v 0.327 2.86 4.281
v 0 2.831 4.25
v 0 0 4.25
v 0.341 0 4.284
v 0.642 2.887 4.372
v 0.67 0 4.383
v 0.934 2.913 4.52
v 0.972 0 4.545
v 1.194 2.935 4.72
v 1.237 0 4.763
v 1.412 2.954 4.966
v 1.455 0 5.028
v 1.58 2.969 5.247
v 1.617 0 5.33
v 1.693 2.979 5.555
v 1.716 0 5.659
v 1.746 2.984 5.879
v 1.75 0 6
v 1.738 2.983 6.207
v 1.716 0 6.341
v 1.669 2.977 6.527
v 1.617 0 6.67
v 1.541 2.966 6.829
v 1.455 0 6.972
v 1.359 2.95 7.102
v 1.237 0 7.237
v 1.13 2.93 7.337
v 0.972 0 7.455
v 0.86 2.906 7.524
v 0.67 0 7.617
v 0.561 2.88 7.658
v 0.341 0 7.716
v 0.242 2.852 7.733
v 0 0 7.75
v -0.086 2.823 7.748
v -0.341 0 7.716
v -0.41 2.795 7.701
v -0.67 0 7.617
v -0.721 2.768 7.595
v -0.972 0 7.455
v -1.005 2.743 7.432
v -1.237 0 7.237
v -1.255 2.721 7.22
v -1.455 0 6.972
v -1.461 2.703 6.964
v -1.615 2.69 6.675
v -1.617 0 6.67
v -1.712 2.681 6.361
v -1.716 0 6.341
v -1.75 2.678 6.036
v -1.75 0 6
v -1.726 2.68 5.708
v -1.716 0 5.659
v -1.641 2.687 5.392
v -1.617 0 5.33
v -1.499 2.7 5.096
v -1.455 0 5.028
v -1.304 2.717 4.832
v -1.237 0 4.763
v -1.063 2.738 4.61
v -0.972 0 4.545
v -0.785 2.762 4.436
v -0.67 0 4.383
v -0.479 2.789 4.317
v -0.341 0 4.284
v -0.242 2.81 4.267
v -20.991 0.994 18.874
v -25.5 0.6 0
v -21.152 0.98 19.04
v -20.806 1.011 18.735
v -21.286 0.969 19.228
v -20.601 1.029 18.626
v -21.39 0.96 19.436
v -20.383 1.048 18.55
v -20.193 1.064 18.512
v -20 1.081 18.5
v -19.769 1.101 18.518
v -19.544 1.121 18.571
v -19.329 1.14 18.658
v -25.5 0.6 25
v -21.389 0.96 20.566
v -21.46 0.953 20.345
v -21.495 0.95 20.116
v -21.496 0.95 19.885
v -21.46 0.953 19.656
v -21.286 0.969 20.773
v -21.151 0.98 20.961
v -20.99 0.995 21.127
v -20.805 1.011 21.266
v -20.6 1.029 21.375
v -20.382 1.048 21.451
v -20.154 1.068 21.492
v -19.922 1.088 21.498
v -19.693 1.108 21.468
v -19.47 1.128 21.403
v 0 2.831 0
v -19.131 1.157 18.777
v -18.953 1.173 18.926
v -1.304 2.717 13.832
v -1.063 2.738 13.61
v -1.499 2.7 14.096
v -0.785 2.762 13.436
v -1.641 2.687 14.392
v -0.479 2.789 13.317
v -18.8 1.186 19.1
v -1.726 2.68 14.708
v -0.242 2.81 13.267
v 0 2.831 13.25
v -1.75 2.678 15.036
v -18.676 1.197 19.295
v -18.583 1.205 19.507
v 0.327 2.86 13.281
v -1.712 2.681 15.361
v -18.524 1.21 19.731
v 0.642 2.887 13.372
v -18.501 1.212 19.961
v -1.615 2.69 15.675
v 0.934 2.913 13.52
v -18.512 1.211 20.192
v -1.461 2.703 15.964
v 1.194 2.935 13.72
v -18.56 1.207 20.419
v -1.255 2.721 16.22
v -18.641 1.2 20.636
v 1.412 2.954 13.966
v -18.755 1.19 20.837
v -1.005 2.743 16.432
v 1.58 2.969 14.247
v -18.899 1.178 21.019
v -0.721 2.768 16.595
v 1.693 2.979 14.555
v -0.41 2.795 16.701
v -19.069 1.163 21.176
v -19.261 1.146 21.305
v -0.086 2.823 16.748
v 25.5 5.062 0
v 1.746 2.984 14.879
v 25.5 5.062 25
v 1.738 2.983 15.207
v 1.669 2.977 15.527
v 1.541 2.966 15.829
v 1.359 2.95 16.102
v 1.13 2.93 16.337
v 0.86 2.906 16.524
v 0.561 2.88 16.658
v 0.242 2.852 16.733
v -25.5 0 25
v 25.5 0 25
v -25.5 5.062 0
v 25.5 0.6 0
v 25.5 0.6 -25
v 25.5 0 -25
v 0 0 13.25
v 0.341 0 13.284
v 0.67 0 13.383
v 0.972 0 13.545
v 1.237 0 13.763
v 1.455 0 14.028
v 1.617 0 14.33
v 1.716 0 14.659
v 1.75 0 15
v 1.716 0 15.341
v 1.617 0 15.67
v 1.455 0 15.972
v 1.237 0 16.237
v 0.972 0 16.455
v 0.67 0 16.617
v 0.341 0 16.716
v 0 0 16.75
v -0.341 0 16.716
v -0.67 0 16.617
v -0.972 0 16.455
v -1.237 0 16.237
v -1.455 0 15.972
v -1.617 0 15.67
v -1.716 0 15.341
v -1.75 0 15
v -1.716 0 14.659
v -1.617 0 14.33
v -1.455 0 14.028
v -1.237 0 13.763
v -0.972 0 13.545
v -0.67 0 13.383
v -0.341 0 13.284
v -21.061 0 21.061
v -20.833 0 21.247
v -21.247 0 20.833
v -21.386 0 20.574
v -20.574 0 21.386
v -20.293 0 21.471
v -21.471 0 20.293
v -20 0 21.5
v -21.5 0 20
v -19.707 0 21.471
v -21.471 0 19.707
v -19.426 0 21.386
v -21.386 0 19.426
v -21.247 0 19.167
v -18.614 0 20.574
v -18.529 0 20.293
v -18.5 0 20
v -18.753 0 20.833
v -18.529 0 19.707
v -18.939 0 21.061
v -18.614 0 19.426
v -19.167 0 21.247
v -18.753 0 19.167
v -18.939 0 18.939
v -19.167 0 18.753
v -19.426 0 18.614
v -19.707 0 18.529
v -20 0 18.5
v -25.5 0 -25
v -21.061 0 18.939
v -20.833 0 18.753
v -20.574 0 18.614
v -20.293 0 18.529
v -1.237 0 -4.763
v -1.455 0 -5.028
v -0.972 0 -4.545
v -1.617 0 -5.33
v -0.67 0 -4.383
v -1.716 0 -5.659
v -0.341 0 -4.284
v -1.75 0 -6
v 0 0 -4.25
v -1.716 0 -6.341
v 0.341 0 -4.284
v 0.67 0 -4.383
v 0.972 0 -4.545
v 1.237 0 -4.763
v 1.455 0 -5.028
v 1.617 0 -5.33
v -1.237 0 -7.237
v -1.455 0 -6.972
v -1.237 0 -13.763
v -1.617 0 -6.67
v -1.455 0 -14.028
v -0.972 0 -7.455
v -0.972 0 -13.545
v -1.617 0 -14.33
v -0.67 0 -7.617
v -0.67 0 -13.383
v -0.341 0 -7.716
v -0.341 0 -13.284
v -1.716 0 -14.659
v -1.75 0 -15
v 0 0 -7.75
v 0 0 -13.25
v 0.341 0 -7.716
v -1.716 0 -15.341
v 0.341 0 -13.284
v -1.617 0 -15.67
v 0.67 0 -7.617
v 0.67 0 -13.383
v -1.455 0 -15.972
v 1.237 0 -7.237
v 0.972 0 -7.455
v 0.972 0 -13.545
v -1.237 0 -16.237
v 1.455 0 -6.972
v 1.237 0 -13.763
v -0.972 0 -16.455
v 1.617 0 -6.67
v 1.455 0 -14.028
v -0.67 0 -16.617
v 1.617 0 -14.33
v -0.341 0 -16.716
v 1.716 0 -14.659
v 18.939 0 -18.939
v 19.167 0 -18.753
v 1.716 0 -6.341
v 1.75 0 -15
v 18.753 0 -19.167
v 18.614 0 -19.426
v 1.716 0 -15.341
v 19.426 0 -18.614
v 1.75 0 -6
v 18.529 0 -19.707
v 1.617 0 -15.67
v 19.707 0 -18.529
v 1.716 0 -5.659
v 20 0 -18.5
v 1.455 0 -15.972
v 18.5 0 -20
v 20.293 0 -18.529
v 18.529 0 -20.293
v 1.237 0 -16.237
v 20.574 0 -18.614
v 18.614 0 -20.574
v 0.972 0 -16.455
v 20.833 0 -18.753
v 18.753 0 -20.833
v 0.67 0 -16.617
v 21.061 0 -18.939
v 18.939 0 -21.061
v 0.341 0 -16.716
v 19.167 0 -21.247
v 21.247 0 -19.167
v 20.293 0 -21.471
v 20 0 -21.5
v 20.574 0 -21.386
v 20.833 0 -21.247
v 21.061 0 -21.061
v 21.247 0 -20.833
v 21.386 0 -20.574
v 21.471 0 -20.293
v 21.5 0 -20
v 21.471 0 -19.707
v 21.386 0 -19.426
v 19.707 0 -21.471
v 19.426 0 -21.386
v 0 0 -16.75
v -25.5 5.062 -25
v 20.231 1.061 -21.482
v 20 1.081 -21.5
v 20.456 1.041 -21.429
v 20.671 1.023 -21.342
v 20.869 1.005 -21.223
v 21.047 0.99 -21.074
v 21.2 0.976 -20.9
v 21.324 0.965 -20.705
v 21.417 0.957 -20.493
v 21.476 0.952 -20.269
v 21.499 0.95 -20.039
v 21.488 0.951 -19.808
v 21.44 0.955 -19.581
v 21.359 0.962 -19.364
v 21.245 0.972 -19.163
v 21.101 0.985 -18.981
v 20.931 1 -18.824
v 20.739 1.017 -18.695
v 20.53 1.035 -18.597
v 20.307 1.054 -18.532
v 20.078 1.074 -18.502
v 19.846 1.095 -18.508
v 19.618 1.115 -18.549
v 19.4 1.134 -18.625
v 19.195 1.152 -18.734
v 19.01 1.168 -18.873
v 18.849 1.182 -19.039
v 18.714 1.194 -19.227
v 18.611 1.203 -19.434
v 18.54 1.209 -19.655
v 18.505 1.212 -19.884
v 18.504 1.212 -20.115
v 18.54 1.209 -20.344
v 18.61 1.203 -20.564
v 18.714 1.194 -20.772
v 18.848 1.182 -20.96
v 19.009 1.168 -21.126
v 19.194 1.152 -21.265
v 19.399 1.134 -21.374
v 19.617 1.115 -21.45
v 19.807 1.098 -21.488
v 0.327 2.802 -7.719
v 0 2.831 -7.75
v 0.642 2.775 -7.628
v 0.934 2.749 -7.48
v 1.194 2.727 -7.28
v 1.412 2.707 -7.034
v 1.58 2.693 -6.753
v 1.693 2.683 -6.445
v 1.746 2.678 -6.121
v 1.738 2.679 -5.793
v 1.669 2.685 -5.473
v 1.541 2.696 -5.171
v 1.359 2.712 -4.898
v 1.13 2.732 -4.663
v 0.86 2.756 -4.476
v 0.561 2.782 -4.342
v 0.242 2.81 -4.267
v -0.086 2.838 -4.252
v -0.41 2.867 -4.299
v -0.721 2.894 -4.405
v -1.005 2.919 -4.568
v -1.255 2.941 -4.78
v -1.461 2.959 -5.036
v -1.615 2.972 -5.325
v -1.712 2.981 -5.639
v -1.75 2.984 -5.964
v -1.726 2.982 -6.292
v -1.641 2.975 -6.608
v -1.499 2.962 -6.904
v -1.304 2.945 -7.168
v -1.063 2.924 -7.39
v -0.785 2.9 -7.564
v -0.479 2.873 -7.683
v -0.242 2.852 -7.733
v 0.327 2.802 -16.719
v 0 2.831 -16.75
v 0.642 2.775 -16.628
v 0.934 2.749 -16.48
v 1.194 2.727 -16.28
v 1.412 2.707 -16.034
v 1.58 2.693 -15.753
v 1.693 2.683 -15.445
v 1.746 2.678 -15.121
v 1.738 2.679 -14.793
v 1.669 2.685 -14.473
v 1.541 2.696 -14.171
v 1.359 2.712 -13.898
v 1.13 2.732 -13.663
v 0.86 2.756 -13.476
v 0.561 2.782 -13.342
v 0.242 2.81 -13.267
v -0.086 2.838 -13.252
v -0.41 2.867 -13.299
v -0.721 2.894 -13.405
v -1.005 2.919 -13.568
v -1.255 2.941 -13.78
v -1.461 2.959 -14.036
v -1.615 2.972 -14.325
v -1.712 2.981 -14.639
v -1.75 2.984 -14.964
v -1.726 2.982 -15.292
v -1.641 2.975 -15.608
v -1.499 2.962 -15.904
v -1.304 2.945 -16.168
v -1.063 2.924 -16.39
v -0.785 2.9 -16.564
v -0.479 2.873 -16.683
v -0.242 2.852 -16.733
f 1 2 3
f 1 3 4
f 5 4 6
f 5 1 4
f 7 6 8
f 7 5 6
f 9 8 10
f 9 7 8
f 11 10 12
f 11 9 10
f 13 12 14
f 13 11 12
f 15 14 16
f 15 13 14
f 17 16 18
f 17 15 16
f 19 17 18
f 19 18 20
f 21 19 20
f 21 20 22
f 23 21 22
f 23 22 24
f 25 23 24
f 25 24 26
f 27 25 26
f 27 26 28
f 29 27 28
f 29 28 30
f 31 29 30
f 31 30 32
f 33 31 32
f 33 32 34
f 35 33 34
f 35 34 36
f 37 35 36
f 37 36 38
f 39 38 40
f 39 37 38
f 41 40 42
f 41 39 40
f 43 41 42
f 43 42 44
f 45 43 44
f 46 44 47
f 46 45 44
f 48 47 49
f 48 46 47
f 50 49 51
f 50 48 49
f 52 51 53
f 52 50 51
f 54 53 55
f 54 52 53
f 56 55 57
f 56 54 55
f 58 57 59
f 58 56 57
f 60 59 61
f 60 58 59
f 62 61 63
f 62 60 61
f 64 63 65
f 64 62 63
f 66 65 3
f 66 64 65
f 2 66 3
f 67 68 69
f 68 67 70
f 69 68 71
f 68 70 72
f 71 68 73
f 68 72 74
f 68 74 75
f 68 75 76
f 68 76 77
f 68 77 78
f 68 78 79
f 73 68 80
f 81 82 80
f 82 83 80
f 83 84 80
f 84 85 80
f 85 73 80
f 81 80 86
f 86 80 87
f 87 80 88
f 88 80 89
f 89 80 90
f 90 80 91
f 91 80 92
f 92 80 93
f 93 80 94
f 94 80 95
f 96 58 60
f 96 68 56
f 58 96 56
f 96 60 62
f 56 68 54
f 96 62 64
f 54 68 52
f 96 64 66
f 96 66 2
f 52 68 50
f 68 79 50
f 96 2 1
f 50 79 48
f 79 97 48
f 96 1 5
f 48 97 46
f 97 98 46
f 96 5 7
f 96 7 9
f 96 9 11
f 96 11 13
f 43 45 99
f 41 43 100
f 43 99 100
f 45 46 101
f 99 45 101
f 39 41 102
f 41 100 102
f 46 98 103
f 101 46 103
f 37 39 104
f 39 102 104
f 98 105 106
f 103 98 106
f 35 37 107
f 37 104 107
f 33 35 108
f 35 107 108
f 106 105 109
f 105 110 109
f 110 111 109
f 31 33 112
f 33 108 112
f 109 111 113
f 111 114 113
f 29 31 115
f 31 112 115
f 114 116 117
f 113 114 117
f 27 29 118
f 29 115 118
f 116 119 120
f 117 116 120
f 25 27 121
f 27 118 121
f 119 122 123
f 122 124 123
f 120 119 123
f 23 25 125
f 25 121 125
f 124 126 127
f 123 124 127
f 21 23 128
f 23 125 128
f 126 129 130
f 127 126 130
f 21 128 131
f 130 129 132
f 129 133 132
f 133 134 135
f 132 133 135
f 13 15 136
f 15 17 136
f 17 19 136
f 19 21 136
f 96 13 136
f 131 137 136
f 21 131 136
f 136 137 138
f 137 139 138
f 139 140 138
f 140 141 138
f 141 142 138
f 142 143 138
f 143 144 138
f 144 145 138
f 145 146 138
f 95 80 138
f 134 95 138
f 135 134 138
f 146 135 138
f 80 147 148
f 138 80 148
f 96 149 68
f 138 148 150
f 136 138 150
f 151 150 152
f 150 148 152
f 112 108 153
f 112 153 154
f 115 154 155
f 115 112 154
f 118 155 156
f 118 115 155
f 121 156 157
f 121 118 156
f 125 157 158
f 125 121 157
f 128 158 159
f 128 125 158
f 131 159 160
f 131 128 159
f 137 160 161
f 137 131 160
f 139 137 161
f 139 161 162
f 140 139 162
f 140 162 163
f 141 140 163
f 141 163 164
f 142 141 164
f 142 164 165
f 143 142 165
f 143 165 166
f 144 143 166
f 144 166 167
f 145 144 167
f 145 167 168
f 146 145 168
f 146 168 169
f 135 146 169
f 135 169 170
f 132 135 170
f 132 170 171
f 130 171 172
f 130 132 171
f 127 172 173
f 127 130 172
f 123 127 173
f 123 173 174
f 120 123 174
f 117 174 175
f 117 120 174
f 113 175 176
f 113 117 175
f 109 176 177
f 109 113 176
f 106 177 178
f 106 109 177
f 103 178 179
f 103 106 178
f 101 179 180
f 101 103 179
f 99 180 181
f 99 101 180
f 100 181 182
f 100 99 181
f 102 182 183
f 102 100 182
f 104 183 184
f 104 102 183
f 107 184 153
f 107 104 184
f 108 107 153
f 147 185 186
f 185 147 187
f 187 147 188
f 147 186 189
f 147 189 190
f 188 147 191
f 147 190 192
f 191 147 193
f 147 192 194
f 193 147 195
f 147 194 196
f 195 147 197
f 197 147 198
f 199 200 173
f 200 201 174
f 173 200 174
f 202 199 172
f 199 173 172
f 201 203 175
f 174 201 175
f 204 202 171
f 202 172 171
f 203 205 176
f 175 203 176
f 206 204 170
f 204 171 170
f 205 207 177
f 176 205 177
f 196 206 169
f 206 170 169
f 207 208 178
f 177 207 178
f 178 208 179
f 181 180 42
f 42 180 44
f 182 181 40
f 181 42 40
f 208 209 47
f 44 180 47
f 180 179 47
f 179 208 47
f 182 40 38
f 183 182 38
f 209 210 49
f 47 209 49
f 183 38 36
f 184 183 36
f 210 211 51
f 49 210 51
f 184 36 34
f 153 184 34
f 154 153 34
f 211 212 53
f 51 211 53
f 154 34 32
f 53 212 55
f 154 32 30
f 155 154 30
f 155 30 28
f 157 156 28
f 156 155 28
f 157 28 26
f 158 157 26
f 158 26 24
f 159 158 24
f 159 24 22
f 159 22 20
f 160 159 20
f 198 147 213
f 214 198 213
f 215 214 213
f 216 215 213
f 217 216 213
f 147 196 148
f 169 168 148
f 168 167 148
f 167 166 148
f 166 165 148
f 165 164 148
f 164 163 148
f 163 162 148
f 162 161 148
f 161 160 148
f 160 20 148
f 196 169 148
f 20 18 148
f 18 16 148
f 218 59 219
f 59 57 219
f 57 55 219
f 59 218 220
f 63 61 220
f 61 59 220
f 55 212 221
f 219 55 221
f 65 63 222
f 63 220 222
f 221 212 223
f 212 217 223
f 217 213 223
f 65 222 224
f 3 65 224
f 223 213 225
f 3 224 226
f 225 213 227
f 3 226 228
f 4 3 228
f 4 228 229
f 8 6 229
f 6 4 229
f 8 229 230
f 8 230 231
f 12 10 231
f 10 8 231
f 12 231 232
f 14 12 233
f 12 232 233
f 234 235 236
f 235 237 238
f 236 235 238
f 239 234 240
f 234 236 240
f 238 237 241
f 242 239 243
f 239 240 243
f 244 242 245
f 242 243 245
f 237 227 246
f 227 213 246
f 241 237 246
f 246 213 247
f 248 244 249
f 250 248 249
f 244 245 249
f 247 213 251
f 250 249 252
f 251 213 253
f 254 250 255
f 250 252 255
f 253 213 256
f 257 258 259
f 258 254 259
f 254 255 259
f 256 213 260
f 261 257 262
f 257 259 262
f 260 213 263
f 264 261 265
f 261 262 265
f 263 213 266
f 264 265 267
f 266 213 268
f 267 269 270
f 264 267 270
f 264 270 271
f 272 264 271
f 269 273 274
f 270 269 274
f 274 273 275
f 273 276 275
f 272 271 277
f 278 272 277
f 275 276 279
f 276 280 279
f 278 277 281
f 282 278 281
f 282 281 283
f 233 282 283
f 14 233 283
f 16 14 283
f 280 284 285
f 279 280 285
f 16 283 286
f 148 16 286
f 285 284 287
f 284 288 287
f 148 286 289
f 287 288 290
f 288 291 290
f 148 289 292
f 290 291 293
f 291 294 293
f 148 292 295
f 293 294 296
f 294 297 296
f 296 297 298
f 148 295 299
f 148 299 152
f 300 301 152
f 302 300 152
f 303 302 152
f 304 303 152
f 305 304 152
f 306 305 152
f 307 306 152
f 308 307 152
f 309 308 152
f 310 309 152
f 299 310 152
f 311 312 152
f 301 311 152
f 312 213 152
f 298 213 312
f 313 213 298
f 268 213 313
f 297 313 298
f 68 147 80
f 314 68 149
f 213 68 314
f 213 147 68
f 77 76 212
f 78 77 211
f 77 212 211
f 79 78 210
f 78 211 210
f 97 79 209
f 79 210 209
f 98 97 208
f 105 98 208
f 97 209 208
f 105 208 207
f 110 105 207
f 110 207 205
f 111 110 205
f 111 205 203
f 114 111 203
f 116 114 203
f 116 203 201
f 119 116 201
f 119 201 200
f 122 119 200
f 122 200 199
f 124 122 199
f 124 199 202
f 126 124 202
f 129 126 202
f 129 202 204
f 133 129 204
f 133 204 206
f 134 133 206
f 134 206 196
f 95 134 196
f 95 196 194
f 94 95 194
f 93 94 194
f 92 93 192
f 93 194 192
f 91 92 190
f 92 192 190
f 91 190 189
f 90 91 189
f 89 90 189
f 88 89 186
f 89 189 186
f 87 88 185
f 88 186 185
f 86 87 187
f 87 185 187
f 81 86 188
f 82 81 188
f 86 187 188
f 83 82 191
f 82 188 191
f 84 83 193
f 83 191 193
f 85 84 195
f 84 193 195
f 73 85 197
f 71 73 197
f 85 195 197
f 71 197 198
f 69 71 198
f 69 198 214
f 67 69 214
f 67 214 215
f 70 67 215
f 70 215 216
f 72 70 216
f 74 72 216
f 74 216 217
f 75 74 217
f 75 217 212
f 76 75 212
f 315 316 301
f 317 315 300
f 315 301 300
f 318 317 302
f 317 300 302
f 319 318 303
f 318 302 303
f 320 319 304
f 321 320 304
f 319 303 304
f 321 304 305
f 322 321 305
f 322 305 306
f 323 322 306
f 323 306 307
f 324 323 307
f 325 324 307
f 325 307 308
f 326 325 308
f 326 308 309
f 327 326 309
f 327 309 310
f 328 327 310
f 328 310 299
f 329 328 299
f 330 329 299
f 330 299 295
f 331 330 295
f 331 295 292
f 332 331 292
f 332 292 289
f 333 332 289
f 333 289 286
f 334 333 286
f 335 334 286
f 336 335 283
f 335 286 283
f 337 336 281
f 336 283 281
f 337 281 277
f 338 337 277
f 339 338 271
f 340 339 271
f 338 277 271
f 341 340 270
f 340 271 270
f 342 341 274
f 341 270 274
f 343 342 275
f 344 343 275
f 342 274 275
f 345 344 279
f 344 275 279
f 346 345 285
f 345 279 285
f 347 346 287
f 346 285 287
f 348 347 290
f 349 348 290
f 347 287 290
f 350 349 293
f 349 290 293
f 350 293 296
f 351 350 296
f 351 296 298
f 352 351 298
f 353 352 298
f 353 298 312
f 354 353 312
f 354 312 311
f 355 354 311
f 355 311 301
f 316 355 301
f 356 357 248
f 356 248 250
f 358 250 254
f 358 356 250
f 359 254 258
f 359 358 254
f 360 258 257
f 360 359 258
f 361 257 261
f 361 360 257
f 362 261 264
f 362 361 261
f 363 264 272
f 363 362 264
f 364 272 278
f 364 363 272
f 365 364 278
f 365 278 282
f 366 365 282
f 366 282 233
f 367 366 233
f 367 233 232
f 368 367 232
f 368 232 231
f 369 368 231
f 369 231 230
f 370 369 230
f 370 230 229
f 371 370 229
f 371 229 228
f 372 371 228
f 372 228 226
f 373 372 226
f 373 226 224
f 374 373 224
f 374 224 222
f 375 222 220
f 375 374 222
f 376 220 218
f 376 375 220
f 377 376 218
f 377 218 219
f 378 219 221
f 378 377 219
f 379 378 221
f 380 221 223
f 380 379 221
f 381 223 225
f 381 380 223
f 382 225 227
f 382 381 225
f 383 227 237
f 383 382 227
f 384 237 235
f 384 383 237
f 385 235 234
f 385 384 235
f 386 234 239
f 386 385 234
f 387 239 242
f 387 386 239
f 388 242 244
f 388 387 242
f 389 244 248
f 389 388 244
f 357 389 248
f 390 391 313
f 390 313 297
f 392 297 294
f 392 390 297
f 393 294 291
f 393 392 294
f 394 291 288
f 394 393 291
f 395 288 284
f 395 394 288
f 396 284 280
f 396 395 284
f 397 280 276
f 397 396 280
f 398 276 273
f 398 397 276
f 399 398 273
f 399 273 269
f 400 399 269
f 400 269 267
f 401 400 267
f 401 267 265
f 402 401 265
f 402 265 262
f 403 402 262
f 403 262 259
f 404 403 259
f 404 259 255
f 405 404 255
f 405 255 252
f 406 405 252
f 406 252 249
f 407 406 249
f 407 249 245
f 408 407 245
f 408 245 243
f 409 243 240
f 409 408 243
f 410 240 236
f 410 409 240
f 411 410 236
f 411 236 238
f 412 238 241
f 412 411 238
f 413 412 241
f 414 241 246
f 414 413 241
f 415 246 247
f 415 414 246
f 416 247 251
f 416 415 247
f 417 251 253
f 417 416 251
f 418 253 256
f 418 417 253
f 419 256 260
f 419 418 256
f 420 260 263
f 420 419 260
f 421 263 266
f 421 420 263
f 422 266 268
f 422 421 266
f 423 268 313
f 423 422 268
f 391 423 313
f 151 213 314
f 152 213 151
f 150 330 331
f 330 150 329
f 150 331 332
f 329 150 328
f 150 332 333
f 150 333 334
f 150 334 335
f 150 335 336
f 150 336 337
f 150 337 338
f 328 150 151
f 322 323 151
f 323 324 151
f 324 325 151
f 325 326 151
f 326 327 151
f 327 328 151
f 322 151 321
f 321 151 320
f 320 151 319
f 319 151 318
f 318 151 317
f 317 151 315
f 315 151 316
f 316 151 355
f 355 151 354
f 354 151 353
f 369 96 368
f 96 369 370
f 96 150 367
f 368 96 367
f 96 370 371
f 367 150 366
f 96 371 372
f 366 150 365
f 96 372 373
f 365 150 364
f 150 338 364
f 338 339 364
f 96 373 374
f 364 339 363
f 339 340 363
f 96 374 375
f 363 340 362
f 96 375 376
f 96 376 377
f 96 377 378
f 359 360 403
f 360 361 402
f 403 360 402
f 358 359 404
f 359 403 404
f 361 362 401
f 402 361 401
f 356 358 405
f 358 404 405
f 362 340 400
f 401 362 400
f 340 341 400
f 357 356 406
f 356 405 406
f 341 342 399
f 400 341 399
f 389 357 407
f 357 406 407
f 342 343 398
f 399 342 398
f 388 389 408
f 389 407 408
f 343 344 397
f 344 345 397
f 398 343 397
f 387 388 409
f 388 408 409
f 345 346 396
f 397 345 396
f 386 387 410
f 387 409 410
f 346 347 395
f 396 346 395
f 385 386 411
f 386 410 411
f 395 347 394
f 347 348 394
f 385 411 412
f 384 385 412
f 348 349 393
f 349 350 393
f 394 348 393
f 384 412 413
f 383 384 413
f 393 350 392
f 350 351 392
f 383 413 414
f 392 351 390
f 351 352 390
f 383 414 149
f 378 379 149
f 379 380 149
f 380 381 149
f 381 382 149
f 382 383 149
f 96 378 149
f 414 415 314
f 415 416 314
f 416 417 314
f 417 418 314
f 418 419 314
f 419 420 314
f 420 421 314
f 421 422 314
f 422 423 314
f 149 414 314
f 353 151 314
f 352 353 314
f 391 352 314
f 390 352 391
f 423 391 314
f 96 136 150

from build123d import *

# Parameters (mm, degrees)
ESBO_O2_W                  = 51
ESBO_O2_H                  = 50
RESSALTO_EXTRUS_O2_DEPTH   = 6
CORTE_EXTRUS_O1_DEPTH      = 25
CORTE_EXTRUS_O3_DEPTH      = 25
CORTE_EXTRUS_O5_DEPTH      = 37.067617785
CORTE_EXTRUS_O5_DEPTH_BACK = 37.067617785
ESBO_O5_R                  = 1.75
ESBO_O7_R                  = 1.5
CORTE_EXTRUS_O6_DEPTH      = 37.067617785


with BuildPart() as part:
    # Esboço2 → Ressalto-extrusão2 (new body)
    with BuildSketch(Plane(origin=(0, 0, 0), x_dir=(1, 0, 0), z_dir=(0, 1, 0))):
        Rectangle(ESBO_O2_W, ESBO_O2_H)
    extrude(amount=RESSALTO_EXTRUS_O2_DEPTH)

    # Esboço3 → Corte-extrusão1 (cut)
    with BuildSketch(Plane.XY.offset(25)):
        Polygon((-25.5, 0.6), (25.5, 5.06192184), (25.5, 6), (-25.5, 6), align=None)
    extrude(amount=-CORTE_EXTRUS_O1_DEPTH, mode=Mode.SUBTRACT)

    # Esboço4 → Corte-extrusão3 (cut)
    with BuildSketch(Plane(origin=(0, 0, -25), x_dir=(-1, 0, 0), z_dir=(0, 0, -1))):
        Polygon((-25.5, 0.6), (25.5, 5.06192184), (25.5, 6), (-25.5, 6), align=None)
    extrude(amount=-CORTE_EXTRUS_O3_DEPTH, mode=Mode.SUBTRACT)

    # Esboço5 → Corte-extrusão5 (cut, two sides: drawn at the far end of the back side and taken through both)
    with BuildSketch(Plane.XZ.offset(-CORTE_EXTRUS_O5_DEPTH_BACK)):
        with Locations((0, 6)):
            Circle(ESBO_O5_R)
        with Locations((0, 15)):
            Circle(ESBO_O5_R)
        with Locations((0, -15)):
            Circle(ESBO_O5_R)
        with Locations((0, -6)):
            Circle(ESBO_O5_R)
    extrude(amount=CORTE_EXTRUS_O5_DEPTH + CORTE_EXTRUS_O5_DEPTH_BACK, mode=Mode.SUBTRACT)

    # Esboço7 → Corte-extrusão6 (cut, through all)
    with BuildSketch(Plane.XZ):
        with Locations((-20, 20)):
            Circle(ESBO_O7_R)
        with Locations((20, -20)):
            Circle(ESBO_O7_R)
    extrude(amount=-CORTE_EXTRUS_O6_DEPTH, mode=Mode.SUBTRACT)


solid = part.part
